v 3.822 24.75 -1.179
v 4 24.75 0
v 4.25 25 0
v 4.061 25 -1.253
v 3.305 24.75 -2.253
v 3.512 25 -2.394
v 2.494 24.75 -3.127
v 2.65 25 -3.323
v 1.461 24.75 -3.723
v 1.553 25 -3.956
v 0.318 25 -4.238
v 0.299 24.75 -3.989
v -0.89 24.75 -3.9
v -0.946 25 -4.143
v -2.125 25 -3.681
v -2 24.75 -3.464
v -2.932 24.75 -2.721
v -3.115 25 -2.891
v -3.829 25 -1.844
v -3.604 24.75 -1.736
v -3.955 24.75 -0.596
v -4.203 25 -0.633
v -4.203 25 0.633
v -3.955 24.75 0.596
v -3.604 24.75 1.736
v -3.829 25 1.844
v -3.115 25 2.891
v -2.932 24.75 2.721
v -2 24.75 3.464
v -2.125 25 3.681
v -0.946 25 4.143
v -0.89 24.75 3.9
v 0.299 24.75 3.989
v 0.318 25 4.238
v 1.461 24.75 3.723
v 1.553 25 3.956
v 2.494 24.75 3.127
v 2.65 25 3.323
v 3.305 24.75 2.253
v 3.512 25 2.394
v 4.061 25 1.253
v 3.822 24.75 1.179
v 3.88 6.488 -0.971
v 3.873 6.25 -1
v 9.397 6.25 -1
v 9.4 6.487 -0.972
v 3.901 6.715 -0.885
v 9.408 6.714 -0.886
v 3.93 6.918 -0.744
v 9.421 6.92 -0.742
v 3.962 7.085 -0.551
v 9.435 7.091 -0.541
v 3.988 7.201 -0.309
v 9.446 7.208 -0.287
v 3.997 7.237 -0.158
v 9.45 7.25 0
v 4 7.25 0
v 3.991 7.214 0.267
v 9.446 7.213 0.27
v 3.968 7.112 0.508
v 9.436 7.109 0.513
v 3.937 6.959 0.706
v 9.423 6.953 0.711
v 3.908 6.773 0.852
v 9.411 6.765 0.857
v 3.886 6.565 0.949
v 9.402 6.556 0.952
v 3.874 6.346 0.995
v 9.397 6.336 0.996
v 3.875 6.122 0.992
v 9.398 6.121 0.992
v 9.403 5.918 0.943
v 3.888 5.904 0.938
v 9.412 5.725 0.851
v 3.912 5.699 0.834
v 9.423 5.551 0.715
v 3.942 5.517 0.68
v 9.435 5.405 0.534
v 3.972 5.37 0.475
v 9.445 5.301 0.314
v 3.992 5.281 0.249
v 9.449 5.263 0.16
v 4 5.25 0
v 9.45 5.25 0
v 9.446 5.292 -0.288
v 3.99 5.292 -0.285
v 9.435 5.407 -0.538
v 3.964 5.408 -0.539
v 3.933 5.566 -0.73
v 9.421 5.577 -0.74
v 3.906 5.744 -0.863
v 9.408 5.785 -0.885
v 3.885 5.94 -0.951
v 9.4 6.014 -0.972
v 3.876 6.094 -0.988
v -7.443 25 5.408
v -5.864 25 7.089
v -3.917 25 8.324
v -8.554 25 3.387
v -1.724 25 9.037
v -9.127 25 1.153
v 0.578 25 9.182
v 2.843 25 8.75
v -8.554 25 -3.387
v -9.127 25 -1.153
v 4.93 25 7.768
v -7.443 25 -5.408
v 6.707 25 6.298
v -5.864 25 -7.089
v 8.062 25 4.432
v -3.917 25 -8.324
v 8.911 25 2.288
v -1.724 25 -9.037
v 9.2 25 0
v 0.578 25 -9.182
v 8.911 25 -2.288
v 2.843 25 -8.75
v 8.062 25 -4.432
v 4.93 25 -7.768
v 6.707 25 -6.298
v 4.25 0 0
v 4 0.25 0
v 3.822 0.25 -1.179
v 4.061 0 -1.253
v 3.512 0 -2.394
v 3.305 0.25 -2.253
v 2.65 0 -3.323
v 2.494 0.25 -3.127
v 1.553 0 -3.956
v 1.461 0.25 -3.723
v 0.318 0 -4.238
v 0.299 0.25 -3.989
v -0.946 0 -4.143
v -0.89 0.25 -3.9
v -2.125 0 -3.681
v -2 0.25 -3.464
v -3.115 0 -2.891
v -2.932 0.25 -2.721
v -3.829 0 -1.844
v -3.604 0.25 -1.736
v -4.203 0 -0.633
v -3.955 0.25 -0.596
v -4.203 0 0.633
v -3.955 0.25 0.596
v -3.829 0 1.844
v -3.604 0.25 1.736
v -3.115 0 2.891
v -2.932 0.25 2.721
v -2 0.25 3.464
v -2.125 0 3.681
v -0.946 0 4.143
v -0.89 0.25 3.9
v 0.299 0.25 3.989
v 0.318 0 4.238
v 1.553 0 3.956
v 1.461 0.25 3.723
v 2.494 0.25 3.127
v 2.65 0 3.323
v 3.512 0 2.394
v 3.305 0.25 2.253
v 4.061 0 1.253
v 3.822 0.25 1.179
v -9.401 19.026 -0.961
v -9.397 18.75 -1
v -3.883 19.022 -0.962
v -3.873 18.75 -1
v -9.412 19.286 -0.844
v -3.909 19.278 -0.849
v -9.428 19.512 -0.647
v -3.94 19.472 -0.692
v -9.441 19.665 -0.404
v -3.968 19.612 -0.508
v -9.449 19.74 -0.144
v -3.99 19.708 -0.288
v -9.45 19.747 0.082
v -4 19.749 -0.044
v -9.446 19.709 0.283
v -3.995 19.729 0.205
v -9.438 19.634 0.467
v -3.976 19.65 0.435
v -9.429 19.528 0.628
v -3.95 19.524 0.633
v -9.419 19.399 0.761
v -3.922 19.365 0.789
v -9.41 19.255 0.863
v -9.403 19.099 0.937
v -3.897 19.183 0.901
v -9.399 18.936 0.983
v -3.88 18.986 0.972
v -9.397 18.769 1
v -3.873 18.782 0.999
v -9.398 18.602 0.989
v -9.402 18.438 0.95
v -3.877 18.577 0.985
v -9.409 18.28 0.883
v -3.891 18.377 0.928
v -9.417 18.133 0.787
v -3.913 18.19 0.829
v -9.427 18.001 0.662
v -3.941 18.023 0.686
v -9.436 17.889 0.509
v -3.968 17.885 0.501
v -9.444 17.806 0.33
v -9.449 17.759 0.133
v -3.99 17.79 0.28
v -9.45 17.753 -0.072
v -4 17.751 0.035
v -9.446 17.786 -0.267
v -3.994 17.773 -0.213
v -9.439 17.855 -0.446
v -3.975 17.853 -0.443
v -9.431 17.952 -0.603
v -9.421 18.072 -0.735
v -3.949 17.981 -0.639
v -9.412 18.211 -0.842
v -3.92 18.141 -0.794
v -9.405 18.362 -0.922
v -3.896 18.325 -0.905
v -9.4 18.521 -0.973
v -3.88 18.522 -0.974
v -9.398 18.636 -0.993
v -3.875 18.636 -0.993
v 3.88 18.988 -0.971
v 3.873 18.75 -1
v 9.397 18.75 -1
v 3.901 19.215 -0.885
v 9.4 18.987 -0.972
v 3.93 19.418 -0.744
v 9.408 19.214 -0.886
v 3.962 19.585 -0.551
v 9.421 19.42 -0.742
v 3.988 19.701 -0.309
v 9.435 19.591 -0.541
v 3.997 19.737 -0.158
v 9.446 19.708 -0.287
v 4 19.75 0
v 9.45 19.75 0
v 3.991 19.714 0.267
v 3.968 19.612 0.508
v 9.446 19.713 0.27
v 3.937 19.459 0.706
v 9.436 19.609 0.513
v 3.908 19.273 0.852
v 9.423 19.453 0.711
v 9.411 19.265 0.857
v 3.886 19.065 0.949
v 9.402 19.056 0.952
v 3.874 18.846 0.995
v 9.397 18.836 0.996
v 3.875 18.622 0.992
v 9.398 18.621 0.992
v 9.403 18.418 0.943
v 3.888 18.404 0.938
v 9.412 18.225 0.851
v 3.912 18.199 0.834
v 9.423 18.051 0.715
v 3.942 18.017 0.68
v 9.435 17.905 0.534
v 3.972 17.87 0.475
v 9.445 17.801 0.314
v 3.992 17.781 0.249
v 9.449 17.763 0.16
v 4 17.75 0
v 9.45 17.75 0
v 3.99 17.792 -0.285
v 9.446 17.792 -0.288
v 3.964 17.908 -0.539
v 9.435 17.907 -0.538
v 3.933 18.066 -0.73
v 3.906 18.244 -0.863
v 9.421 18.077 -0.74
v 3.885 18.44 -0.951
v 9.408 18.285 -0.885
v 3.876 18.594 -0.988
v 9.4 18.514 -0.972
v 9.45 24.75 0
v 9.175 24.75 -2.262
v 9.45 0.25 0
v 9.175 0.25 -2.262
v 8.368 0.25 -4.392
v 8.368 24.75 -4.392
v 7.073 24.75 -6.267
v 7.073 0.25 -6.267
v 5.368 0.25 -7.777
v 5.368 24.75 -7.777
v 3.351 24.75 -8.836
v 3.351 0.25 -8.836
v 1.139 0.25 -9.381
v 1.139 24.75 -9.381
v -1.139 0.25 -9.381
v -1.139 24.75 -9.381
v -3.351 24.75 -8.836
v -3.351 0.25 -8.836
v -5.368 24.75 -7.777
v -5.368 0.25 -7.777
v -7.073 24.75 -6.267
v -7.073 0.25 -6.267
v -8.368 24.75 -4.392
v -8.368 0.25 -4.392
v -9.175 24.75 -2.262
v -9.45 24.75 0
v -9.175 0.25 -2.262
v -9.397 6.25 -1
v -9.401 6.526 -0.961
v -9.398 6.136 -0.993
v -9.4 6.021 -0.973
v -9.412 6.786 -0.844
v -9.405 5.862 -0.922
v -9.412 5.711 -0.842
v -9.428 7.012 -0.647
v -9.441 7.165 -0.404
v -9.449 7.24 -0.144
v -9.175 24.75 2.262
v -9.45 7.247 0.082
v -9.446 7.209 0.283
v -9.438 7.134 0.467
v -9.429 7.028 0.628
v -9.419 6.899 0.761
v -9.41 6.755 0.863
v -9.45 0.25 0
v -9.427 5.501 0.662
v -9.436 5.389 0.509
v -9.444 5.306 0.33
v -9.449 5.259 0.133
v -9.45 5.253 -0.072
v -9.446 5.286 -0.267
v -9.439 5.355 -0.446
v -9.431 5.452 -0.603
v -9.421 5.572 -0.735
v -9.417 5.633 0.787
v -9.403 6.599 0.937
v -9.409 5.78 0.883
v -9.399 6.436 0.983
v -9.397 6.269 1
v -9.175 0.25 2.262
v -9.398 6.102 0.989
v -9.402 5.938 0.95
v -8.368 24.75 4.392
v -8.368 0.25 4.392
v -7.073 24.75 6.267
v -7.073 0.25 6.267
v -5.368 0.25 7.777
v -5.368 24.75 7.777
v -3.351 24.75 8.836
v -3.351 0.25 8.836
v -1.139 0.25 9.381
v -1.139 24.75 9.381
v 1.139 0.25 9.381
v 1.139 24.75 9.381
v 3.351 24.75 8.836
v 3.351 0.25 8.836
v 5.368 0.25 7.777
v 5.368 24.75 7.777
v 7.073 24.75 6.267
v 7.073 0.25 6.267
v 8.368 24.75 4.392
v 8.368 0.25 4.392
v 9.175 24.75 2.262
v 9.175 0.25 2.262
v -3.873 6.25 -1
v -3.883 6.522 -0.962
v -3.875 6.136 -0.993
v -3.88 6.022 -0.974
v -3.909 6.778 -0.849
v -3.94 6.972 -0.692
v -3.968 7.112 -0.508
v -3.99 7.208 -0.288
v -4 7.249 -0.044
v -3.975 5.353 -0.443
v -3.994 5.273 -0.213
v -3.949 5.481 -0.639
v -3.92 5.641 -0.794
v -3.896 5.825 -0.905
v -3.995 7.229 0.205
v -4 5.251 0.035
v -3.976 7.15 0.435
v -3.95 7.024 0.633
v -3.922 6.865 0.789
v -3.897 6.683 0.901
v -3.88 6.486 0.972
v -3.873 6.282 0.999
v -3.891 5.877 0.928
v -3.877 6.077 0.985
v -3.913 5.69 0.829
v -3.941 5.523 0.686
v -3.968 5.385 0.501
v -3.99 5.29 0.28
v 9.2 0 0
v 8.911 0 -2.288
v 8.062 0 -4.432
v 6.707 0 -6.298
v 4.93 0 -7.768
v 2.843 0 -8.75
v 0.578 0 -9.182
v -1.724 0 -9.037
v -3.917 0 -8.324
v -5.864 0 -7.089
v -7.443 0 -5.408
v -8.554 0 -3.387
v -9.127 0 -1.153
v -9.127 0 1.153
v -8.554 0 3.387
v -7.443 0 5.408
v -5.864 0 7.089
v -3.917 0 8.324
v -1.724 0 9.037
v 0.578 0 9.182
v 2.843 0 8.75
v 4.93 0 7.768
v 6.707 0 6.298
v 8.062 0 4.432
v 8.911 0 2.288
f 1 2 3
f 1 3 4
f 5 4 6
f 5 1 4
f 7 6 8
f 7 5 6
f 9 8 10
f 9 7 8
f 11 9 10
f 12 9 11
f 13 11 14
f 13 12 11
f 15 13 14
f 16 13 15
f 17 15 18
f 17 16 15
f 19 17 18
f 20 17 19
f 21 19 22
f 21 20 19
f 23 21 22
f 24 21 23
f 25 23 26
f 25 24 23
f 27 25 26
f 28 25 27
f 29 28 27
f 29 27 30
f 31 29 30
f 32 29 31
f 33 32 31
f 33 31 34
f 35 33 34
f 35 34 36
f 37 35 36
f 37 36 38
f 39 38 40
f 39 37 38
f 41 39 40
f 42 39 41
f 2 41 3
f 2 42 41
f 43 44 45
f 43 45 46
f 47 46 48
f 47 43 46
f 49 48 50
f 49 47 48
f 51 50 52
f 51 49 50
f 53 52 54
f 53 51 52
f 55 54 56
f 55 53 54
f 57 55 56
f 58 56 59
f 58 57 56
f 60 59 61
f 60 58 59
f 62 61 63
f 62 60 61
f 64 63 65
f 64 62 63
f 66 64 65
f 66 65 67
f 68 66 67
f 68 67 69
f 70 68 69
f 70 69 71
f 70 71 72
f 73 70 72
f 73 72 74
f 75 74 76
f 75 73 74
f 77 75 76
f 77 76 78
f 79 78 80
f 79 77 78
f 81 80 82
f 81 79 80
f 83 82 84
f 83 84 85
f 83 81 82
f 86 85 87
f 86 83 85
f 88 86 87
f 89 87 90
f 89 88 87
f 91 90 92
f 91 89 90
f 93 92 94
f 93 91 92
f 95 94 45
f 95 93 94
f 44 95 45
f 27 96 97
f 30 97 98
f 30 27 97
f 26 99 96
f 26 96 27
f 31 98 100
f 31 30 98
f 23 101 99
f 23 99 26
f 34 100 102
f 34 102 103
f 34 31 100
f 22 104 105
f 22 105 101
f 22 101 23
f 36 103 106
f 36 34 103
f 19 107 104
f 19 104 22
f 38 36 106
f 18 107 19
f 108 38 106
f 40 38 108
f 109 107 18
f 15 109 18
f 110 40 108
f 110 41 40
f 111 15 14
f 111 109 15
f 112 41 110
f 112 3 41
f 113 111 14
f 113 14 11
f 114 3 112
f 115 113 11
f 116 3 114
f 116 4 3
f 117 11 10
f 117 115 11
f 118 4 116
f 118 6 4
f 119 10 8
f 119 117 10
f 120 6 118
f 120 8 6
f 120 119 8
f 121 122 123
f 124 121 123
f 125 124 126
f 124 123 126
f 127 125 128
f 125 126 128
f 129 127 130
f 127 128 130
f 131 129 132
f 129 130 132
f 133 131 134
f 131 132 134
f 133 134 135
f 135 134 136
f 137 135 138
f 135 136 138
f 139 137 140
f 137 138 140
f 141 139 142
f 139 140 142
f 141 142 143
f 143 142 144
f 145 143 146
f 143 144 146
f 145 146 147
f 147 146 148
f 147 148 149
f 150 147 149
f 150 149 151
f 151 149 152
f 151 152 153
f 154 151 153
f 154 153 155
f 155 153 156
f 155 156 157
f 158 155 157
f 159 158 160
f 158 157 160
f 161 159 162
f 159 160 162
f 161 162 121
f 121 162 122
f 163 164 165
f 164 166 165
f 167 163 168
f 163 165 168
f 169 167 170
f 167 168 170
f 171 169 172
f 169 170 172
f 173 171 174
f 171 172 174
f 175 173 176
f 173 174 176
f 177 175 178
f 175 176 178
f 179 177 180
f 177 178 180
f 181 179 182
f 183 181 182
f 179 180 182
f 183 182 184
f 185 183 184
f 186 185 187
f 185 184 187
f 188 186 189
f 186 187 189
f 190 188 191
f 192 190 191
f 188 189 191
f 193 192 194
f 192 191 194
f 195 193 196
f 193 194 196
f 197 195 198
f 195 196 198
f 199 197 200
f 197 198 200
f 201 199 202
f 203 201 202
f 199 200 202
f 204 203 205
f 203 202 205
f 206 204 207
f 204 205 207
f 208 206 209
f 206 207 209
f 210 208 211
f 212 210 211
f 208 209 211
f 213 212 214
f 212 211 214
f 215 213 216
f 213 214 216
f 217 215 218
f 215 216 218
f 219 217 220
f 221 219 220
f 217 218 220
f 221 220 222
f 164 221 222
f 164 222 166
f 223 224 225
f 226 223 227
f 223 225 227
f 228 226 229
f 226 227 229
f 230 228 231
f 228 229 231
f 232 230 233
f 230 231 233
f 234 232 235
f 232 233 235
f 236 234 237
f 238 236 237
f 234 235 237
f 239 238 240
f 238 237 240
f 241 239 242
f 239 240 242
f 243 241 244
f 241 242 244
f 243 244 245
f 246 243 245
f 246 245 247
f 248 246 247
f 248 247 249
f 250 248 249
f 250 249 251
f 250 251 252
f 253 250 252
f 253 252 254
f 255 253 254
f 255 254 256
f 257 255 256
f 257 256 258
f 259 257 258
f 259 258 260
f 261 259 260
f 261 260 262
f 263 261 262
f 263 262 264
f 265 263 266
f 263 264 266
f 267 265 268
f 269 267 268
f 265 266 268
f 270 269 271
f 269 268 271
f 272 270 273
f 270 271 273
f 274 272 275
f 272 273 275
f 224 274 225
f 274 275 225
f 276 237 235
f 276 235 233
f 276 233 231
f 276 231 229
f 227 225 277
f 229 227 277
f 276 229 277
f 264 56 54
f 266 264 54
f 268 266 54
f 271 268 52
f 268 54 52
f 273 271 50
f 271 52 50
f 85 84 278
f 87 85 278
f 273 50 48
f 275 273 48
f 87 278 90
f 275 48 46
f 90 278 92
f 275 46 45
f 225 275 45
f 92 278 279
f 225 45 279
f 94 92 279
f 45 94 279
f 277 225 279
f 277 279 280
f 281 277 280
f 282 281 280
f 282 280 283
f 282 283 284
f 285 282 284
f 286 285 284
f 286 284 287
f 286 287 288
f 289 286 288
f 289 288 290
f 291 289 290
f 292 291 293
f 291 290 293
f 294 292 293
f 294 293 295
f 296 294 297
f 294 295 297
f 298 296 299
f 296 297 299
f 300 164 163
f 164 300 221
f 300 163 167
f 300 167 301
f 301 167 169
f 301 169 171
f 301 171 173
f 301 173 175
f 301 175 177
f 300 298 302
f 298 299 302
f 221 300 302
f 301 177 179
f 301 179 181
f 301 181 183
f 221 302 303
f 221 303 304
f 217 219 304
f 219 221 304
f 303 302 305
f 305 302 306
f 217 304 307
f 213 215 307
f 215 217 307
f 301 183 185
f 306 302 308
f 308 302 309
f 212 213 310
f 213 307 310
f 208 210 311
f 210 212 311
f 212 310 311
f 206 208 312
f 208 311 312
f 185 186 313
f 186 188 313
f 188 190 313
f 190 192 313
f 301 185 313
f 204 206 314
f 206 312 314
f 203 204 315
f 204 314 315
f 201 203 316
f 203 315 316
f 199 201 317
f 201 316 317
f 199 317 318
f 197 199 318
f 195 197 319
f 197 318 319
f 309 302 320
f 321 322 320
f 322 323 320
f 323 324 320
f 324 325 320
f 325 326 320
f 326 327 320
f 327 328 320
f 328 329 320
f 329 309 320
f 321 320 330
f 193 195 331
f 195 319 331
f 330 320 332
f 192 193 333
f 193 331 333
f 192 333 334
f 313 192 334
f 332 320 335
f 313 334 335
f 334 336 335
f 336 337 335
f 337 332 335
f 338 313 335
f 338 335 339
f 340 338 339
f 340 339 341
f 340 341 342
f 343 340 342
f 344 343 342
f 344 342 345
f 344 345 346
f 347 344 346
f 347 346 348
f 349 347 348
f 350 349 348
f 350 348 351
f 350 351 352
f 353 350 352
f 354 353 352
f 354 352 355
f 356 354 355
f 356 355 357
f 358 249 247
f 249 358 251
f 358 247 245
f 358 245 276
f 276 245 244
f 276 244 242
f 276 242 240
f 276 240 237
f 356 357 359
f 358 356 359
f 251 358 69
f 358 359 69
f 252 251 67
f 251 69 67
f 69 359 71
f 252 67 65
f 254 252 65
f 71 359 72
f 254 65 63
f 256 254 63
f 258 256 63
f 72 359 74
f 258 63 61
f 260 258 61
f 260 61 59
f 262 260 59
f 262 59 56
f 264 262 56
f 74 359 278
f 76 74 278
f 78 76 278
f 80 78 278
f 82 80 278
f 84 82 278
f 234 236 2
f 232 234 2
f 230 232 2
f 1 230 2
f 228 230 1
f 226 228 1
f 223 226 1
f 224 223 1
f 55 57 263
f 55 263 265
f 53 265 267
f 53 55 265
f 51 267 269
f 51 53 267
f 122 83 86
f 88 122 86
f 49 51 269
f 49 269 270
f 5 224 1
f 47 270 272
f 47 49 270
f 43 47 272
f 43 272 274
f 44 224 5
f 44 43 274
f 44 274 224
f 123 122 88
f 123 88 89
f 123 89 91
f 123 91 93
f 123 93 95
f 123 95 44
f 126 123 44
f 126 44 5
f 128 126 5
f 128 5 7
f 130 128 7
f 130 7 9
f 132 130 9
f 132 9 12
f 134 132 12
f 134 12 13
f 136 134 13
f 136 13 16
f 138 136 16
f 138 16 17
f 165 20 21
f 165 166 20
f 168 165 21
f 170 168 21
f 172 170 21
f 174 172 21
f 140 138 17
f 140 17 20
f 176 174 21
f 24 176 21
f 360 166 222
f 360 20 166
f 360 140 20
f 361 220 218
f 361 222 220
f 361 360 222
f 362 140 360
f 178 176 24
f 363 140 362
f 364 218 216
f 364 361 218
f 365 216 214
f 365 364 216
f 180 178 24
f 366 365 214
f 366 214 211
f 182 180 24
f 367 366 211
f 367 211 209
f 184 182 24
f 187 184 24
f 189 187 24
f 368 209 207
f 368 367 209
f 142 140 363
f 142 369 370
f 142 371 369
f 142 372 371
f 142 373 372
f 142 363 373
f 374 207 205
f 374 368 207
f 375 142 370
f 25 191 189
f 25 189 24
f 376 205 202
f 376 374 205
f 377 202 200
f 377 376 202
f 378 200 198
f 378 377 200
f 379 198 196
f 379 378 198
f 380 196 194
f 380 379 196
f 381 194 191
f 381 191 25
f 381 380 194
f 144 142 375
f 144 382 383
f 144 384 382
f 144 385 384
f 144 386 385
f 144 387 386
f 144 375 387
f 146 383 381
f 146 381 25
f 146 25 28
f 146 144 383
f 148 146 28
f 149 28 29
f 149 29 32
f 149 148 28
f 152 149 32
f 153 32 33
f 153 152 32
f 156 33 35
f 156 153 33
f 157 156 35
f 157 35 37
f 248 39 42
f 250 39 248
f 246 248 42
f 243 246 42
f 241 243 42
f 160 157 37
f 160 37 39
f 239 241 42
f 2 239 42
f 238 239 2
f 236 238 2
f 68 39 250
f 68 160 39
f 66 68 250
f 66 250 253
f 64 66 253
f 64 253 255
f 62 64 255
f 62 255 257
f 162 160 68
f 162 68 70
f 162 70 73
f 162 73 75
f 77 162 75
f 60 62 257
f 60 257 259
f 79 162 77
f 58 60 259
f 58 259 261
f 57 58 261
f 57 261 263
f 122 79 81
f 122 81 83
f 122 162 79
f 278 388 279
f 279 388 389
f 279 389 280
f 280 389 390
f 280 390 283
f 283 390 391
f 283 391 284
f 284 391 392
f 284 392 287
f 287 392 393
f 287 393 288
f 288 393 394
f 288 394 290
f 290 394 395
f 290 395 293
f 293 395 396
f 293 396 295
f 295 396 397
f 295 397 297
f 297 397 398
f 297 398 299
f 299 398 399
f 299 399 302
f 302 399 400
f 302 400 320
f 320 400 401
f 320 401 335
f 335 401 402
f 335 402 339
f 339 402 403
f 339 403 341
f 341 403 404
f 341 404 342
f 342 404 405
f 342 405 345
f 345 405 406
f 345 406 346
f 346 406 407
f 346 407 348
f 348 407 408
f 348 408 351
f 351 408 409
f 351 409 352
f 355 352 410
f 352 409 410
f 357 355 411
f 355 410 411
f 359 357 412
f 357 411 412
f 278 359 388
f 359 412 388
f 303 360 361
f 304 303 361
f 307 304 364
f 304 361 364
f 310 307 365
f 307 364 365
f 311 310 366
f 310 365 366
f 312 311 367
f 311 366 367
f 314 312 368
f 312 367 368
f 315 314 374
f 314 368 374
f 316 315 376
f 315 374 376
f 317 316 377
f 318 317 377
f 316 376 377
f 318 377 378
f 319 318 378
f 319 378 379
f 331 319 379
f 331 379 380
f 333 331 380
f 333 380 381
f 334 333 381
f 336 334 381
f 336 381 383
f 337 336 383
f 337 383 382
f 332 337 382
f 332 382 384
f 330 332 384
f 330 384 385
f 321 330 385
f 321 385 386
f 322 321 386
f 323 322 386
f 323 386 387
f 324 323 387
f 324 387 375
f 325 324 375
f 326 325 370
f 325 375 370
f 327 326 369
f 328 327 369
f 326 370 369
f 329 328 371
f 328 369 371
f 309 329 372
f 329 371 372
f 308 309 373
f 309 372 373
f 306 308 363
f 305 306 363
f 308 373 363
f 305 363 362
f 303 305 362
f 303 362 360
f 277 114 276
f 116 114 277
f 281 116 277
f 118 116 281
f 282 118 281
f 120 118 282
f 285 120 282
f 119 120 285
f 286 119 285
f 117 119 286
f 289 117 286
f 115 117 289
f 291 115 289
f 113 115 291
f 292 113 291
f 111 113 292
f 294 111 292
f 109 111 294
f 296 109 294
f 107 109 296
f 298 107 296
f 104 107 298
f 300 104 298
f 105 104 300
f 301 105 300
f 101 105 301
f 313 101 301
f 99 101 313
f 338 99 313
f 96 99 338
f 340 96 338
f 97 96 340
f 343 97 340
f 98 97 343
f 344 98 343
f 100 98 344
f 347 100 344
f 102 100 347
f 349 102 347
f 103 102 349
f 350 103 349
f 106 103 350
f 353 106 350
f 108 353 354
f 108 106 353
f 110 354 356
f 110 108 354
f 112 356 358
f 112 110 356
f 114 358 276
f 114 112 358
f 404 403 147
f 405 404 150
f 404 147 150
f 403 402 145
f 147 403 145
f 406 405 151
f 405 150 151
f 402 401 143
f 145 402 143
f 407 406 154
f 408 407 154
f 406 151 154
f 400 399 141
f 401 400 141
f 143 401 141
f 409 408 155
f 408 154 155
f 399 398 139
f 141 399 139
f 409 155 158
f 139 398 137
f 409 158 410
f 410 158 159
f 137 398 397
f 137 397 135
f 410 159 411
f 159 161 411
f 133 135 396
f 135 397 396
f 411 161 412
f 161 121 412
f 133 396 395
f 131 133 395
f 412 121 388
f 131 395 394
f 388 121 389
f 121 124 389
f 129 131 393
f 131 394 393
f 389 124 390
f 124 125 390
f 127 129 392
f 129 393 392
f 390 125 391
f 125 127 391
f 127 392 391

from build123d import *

# Parameters (mm, degrees)
SKETCH1_R           = 9.45
SKETCH1_R_2         = 4
BOSS_EXTRUDE1_DEPTH = 25
SKETCH2_R           = 1
CUT_EXTRUDE1_DEPTH  = 12.5
CHAMFER1_SIZE       = 0.25


with BuildPart() as part:
    # Sketch1 → Boss-Extrude1 (new body)
    with BuildSketch(Plane(origin=(0, 0, 0), x_dir=(1, 0, 0), z_dir=(0, 1, 0))):
        Circle(SKETCH1_R)
        Circle(SKETCH1_R_2, mode=Mode.SUBTRACT)
    extrude(amount=BOSS_EXTRUDE1_DEPTH)

    # Sketch2 → Cut-Extrude1 (cut, symmetric)
    with BuildSketch(Plane(origin=(0, 0, 0), x_dir=(0, 0, -1), z_dir=(1, 0, 0))):
        with Locations((0, 6.25)):
            Circle(SKETCH2_R)
        with Locations((0, 18.75)):
            Circle(SKETCH2_R)
    extrude(amount=CUT_EXTRUDE1_DEPTH, both=True, mode=Mode.SUBTRACT)

    # Chamfer1
    chamfer1_edges = [part.edges().sort_by_distance(p)[0] for p in [
        (-9.45, 0, 0),
        (-9.45, 25, 0),
        (-4, 0, 0),
        (-4, 25, 0),
    ]]
    chamfer(chamfer1_edges, length=CHAMFER1_SIZE)


solid = part.part
